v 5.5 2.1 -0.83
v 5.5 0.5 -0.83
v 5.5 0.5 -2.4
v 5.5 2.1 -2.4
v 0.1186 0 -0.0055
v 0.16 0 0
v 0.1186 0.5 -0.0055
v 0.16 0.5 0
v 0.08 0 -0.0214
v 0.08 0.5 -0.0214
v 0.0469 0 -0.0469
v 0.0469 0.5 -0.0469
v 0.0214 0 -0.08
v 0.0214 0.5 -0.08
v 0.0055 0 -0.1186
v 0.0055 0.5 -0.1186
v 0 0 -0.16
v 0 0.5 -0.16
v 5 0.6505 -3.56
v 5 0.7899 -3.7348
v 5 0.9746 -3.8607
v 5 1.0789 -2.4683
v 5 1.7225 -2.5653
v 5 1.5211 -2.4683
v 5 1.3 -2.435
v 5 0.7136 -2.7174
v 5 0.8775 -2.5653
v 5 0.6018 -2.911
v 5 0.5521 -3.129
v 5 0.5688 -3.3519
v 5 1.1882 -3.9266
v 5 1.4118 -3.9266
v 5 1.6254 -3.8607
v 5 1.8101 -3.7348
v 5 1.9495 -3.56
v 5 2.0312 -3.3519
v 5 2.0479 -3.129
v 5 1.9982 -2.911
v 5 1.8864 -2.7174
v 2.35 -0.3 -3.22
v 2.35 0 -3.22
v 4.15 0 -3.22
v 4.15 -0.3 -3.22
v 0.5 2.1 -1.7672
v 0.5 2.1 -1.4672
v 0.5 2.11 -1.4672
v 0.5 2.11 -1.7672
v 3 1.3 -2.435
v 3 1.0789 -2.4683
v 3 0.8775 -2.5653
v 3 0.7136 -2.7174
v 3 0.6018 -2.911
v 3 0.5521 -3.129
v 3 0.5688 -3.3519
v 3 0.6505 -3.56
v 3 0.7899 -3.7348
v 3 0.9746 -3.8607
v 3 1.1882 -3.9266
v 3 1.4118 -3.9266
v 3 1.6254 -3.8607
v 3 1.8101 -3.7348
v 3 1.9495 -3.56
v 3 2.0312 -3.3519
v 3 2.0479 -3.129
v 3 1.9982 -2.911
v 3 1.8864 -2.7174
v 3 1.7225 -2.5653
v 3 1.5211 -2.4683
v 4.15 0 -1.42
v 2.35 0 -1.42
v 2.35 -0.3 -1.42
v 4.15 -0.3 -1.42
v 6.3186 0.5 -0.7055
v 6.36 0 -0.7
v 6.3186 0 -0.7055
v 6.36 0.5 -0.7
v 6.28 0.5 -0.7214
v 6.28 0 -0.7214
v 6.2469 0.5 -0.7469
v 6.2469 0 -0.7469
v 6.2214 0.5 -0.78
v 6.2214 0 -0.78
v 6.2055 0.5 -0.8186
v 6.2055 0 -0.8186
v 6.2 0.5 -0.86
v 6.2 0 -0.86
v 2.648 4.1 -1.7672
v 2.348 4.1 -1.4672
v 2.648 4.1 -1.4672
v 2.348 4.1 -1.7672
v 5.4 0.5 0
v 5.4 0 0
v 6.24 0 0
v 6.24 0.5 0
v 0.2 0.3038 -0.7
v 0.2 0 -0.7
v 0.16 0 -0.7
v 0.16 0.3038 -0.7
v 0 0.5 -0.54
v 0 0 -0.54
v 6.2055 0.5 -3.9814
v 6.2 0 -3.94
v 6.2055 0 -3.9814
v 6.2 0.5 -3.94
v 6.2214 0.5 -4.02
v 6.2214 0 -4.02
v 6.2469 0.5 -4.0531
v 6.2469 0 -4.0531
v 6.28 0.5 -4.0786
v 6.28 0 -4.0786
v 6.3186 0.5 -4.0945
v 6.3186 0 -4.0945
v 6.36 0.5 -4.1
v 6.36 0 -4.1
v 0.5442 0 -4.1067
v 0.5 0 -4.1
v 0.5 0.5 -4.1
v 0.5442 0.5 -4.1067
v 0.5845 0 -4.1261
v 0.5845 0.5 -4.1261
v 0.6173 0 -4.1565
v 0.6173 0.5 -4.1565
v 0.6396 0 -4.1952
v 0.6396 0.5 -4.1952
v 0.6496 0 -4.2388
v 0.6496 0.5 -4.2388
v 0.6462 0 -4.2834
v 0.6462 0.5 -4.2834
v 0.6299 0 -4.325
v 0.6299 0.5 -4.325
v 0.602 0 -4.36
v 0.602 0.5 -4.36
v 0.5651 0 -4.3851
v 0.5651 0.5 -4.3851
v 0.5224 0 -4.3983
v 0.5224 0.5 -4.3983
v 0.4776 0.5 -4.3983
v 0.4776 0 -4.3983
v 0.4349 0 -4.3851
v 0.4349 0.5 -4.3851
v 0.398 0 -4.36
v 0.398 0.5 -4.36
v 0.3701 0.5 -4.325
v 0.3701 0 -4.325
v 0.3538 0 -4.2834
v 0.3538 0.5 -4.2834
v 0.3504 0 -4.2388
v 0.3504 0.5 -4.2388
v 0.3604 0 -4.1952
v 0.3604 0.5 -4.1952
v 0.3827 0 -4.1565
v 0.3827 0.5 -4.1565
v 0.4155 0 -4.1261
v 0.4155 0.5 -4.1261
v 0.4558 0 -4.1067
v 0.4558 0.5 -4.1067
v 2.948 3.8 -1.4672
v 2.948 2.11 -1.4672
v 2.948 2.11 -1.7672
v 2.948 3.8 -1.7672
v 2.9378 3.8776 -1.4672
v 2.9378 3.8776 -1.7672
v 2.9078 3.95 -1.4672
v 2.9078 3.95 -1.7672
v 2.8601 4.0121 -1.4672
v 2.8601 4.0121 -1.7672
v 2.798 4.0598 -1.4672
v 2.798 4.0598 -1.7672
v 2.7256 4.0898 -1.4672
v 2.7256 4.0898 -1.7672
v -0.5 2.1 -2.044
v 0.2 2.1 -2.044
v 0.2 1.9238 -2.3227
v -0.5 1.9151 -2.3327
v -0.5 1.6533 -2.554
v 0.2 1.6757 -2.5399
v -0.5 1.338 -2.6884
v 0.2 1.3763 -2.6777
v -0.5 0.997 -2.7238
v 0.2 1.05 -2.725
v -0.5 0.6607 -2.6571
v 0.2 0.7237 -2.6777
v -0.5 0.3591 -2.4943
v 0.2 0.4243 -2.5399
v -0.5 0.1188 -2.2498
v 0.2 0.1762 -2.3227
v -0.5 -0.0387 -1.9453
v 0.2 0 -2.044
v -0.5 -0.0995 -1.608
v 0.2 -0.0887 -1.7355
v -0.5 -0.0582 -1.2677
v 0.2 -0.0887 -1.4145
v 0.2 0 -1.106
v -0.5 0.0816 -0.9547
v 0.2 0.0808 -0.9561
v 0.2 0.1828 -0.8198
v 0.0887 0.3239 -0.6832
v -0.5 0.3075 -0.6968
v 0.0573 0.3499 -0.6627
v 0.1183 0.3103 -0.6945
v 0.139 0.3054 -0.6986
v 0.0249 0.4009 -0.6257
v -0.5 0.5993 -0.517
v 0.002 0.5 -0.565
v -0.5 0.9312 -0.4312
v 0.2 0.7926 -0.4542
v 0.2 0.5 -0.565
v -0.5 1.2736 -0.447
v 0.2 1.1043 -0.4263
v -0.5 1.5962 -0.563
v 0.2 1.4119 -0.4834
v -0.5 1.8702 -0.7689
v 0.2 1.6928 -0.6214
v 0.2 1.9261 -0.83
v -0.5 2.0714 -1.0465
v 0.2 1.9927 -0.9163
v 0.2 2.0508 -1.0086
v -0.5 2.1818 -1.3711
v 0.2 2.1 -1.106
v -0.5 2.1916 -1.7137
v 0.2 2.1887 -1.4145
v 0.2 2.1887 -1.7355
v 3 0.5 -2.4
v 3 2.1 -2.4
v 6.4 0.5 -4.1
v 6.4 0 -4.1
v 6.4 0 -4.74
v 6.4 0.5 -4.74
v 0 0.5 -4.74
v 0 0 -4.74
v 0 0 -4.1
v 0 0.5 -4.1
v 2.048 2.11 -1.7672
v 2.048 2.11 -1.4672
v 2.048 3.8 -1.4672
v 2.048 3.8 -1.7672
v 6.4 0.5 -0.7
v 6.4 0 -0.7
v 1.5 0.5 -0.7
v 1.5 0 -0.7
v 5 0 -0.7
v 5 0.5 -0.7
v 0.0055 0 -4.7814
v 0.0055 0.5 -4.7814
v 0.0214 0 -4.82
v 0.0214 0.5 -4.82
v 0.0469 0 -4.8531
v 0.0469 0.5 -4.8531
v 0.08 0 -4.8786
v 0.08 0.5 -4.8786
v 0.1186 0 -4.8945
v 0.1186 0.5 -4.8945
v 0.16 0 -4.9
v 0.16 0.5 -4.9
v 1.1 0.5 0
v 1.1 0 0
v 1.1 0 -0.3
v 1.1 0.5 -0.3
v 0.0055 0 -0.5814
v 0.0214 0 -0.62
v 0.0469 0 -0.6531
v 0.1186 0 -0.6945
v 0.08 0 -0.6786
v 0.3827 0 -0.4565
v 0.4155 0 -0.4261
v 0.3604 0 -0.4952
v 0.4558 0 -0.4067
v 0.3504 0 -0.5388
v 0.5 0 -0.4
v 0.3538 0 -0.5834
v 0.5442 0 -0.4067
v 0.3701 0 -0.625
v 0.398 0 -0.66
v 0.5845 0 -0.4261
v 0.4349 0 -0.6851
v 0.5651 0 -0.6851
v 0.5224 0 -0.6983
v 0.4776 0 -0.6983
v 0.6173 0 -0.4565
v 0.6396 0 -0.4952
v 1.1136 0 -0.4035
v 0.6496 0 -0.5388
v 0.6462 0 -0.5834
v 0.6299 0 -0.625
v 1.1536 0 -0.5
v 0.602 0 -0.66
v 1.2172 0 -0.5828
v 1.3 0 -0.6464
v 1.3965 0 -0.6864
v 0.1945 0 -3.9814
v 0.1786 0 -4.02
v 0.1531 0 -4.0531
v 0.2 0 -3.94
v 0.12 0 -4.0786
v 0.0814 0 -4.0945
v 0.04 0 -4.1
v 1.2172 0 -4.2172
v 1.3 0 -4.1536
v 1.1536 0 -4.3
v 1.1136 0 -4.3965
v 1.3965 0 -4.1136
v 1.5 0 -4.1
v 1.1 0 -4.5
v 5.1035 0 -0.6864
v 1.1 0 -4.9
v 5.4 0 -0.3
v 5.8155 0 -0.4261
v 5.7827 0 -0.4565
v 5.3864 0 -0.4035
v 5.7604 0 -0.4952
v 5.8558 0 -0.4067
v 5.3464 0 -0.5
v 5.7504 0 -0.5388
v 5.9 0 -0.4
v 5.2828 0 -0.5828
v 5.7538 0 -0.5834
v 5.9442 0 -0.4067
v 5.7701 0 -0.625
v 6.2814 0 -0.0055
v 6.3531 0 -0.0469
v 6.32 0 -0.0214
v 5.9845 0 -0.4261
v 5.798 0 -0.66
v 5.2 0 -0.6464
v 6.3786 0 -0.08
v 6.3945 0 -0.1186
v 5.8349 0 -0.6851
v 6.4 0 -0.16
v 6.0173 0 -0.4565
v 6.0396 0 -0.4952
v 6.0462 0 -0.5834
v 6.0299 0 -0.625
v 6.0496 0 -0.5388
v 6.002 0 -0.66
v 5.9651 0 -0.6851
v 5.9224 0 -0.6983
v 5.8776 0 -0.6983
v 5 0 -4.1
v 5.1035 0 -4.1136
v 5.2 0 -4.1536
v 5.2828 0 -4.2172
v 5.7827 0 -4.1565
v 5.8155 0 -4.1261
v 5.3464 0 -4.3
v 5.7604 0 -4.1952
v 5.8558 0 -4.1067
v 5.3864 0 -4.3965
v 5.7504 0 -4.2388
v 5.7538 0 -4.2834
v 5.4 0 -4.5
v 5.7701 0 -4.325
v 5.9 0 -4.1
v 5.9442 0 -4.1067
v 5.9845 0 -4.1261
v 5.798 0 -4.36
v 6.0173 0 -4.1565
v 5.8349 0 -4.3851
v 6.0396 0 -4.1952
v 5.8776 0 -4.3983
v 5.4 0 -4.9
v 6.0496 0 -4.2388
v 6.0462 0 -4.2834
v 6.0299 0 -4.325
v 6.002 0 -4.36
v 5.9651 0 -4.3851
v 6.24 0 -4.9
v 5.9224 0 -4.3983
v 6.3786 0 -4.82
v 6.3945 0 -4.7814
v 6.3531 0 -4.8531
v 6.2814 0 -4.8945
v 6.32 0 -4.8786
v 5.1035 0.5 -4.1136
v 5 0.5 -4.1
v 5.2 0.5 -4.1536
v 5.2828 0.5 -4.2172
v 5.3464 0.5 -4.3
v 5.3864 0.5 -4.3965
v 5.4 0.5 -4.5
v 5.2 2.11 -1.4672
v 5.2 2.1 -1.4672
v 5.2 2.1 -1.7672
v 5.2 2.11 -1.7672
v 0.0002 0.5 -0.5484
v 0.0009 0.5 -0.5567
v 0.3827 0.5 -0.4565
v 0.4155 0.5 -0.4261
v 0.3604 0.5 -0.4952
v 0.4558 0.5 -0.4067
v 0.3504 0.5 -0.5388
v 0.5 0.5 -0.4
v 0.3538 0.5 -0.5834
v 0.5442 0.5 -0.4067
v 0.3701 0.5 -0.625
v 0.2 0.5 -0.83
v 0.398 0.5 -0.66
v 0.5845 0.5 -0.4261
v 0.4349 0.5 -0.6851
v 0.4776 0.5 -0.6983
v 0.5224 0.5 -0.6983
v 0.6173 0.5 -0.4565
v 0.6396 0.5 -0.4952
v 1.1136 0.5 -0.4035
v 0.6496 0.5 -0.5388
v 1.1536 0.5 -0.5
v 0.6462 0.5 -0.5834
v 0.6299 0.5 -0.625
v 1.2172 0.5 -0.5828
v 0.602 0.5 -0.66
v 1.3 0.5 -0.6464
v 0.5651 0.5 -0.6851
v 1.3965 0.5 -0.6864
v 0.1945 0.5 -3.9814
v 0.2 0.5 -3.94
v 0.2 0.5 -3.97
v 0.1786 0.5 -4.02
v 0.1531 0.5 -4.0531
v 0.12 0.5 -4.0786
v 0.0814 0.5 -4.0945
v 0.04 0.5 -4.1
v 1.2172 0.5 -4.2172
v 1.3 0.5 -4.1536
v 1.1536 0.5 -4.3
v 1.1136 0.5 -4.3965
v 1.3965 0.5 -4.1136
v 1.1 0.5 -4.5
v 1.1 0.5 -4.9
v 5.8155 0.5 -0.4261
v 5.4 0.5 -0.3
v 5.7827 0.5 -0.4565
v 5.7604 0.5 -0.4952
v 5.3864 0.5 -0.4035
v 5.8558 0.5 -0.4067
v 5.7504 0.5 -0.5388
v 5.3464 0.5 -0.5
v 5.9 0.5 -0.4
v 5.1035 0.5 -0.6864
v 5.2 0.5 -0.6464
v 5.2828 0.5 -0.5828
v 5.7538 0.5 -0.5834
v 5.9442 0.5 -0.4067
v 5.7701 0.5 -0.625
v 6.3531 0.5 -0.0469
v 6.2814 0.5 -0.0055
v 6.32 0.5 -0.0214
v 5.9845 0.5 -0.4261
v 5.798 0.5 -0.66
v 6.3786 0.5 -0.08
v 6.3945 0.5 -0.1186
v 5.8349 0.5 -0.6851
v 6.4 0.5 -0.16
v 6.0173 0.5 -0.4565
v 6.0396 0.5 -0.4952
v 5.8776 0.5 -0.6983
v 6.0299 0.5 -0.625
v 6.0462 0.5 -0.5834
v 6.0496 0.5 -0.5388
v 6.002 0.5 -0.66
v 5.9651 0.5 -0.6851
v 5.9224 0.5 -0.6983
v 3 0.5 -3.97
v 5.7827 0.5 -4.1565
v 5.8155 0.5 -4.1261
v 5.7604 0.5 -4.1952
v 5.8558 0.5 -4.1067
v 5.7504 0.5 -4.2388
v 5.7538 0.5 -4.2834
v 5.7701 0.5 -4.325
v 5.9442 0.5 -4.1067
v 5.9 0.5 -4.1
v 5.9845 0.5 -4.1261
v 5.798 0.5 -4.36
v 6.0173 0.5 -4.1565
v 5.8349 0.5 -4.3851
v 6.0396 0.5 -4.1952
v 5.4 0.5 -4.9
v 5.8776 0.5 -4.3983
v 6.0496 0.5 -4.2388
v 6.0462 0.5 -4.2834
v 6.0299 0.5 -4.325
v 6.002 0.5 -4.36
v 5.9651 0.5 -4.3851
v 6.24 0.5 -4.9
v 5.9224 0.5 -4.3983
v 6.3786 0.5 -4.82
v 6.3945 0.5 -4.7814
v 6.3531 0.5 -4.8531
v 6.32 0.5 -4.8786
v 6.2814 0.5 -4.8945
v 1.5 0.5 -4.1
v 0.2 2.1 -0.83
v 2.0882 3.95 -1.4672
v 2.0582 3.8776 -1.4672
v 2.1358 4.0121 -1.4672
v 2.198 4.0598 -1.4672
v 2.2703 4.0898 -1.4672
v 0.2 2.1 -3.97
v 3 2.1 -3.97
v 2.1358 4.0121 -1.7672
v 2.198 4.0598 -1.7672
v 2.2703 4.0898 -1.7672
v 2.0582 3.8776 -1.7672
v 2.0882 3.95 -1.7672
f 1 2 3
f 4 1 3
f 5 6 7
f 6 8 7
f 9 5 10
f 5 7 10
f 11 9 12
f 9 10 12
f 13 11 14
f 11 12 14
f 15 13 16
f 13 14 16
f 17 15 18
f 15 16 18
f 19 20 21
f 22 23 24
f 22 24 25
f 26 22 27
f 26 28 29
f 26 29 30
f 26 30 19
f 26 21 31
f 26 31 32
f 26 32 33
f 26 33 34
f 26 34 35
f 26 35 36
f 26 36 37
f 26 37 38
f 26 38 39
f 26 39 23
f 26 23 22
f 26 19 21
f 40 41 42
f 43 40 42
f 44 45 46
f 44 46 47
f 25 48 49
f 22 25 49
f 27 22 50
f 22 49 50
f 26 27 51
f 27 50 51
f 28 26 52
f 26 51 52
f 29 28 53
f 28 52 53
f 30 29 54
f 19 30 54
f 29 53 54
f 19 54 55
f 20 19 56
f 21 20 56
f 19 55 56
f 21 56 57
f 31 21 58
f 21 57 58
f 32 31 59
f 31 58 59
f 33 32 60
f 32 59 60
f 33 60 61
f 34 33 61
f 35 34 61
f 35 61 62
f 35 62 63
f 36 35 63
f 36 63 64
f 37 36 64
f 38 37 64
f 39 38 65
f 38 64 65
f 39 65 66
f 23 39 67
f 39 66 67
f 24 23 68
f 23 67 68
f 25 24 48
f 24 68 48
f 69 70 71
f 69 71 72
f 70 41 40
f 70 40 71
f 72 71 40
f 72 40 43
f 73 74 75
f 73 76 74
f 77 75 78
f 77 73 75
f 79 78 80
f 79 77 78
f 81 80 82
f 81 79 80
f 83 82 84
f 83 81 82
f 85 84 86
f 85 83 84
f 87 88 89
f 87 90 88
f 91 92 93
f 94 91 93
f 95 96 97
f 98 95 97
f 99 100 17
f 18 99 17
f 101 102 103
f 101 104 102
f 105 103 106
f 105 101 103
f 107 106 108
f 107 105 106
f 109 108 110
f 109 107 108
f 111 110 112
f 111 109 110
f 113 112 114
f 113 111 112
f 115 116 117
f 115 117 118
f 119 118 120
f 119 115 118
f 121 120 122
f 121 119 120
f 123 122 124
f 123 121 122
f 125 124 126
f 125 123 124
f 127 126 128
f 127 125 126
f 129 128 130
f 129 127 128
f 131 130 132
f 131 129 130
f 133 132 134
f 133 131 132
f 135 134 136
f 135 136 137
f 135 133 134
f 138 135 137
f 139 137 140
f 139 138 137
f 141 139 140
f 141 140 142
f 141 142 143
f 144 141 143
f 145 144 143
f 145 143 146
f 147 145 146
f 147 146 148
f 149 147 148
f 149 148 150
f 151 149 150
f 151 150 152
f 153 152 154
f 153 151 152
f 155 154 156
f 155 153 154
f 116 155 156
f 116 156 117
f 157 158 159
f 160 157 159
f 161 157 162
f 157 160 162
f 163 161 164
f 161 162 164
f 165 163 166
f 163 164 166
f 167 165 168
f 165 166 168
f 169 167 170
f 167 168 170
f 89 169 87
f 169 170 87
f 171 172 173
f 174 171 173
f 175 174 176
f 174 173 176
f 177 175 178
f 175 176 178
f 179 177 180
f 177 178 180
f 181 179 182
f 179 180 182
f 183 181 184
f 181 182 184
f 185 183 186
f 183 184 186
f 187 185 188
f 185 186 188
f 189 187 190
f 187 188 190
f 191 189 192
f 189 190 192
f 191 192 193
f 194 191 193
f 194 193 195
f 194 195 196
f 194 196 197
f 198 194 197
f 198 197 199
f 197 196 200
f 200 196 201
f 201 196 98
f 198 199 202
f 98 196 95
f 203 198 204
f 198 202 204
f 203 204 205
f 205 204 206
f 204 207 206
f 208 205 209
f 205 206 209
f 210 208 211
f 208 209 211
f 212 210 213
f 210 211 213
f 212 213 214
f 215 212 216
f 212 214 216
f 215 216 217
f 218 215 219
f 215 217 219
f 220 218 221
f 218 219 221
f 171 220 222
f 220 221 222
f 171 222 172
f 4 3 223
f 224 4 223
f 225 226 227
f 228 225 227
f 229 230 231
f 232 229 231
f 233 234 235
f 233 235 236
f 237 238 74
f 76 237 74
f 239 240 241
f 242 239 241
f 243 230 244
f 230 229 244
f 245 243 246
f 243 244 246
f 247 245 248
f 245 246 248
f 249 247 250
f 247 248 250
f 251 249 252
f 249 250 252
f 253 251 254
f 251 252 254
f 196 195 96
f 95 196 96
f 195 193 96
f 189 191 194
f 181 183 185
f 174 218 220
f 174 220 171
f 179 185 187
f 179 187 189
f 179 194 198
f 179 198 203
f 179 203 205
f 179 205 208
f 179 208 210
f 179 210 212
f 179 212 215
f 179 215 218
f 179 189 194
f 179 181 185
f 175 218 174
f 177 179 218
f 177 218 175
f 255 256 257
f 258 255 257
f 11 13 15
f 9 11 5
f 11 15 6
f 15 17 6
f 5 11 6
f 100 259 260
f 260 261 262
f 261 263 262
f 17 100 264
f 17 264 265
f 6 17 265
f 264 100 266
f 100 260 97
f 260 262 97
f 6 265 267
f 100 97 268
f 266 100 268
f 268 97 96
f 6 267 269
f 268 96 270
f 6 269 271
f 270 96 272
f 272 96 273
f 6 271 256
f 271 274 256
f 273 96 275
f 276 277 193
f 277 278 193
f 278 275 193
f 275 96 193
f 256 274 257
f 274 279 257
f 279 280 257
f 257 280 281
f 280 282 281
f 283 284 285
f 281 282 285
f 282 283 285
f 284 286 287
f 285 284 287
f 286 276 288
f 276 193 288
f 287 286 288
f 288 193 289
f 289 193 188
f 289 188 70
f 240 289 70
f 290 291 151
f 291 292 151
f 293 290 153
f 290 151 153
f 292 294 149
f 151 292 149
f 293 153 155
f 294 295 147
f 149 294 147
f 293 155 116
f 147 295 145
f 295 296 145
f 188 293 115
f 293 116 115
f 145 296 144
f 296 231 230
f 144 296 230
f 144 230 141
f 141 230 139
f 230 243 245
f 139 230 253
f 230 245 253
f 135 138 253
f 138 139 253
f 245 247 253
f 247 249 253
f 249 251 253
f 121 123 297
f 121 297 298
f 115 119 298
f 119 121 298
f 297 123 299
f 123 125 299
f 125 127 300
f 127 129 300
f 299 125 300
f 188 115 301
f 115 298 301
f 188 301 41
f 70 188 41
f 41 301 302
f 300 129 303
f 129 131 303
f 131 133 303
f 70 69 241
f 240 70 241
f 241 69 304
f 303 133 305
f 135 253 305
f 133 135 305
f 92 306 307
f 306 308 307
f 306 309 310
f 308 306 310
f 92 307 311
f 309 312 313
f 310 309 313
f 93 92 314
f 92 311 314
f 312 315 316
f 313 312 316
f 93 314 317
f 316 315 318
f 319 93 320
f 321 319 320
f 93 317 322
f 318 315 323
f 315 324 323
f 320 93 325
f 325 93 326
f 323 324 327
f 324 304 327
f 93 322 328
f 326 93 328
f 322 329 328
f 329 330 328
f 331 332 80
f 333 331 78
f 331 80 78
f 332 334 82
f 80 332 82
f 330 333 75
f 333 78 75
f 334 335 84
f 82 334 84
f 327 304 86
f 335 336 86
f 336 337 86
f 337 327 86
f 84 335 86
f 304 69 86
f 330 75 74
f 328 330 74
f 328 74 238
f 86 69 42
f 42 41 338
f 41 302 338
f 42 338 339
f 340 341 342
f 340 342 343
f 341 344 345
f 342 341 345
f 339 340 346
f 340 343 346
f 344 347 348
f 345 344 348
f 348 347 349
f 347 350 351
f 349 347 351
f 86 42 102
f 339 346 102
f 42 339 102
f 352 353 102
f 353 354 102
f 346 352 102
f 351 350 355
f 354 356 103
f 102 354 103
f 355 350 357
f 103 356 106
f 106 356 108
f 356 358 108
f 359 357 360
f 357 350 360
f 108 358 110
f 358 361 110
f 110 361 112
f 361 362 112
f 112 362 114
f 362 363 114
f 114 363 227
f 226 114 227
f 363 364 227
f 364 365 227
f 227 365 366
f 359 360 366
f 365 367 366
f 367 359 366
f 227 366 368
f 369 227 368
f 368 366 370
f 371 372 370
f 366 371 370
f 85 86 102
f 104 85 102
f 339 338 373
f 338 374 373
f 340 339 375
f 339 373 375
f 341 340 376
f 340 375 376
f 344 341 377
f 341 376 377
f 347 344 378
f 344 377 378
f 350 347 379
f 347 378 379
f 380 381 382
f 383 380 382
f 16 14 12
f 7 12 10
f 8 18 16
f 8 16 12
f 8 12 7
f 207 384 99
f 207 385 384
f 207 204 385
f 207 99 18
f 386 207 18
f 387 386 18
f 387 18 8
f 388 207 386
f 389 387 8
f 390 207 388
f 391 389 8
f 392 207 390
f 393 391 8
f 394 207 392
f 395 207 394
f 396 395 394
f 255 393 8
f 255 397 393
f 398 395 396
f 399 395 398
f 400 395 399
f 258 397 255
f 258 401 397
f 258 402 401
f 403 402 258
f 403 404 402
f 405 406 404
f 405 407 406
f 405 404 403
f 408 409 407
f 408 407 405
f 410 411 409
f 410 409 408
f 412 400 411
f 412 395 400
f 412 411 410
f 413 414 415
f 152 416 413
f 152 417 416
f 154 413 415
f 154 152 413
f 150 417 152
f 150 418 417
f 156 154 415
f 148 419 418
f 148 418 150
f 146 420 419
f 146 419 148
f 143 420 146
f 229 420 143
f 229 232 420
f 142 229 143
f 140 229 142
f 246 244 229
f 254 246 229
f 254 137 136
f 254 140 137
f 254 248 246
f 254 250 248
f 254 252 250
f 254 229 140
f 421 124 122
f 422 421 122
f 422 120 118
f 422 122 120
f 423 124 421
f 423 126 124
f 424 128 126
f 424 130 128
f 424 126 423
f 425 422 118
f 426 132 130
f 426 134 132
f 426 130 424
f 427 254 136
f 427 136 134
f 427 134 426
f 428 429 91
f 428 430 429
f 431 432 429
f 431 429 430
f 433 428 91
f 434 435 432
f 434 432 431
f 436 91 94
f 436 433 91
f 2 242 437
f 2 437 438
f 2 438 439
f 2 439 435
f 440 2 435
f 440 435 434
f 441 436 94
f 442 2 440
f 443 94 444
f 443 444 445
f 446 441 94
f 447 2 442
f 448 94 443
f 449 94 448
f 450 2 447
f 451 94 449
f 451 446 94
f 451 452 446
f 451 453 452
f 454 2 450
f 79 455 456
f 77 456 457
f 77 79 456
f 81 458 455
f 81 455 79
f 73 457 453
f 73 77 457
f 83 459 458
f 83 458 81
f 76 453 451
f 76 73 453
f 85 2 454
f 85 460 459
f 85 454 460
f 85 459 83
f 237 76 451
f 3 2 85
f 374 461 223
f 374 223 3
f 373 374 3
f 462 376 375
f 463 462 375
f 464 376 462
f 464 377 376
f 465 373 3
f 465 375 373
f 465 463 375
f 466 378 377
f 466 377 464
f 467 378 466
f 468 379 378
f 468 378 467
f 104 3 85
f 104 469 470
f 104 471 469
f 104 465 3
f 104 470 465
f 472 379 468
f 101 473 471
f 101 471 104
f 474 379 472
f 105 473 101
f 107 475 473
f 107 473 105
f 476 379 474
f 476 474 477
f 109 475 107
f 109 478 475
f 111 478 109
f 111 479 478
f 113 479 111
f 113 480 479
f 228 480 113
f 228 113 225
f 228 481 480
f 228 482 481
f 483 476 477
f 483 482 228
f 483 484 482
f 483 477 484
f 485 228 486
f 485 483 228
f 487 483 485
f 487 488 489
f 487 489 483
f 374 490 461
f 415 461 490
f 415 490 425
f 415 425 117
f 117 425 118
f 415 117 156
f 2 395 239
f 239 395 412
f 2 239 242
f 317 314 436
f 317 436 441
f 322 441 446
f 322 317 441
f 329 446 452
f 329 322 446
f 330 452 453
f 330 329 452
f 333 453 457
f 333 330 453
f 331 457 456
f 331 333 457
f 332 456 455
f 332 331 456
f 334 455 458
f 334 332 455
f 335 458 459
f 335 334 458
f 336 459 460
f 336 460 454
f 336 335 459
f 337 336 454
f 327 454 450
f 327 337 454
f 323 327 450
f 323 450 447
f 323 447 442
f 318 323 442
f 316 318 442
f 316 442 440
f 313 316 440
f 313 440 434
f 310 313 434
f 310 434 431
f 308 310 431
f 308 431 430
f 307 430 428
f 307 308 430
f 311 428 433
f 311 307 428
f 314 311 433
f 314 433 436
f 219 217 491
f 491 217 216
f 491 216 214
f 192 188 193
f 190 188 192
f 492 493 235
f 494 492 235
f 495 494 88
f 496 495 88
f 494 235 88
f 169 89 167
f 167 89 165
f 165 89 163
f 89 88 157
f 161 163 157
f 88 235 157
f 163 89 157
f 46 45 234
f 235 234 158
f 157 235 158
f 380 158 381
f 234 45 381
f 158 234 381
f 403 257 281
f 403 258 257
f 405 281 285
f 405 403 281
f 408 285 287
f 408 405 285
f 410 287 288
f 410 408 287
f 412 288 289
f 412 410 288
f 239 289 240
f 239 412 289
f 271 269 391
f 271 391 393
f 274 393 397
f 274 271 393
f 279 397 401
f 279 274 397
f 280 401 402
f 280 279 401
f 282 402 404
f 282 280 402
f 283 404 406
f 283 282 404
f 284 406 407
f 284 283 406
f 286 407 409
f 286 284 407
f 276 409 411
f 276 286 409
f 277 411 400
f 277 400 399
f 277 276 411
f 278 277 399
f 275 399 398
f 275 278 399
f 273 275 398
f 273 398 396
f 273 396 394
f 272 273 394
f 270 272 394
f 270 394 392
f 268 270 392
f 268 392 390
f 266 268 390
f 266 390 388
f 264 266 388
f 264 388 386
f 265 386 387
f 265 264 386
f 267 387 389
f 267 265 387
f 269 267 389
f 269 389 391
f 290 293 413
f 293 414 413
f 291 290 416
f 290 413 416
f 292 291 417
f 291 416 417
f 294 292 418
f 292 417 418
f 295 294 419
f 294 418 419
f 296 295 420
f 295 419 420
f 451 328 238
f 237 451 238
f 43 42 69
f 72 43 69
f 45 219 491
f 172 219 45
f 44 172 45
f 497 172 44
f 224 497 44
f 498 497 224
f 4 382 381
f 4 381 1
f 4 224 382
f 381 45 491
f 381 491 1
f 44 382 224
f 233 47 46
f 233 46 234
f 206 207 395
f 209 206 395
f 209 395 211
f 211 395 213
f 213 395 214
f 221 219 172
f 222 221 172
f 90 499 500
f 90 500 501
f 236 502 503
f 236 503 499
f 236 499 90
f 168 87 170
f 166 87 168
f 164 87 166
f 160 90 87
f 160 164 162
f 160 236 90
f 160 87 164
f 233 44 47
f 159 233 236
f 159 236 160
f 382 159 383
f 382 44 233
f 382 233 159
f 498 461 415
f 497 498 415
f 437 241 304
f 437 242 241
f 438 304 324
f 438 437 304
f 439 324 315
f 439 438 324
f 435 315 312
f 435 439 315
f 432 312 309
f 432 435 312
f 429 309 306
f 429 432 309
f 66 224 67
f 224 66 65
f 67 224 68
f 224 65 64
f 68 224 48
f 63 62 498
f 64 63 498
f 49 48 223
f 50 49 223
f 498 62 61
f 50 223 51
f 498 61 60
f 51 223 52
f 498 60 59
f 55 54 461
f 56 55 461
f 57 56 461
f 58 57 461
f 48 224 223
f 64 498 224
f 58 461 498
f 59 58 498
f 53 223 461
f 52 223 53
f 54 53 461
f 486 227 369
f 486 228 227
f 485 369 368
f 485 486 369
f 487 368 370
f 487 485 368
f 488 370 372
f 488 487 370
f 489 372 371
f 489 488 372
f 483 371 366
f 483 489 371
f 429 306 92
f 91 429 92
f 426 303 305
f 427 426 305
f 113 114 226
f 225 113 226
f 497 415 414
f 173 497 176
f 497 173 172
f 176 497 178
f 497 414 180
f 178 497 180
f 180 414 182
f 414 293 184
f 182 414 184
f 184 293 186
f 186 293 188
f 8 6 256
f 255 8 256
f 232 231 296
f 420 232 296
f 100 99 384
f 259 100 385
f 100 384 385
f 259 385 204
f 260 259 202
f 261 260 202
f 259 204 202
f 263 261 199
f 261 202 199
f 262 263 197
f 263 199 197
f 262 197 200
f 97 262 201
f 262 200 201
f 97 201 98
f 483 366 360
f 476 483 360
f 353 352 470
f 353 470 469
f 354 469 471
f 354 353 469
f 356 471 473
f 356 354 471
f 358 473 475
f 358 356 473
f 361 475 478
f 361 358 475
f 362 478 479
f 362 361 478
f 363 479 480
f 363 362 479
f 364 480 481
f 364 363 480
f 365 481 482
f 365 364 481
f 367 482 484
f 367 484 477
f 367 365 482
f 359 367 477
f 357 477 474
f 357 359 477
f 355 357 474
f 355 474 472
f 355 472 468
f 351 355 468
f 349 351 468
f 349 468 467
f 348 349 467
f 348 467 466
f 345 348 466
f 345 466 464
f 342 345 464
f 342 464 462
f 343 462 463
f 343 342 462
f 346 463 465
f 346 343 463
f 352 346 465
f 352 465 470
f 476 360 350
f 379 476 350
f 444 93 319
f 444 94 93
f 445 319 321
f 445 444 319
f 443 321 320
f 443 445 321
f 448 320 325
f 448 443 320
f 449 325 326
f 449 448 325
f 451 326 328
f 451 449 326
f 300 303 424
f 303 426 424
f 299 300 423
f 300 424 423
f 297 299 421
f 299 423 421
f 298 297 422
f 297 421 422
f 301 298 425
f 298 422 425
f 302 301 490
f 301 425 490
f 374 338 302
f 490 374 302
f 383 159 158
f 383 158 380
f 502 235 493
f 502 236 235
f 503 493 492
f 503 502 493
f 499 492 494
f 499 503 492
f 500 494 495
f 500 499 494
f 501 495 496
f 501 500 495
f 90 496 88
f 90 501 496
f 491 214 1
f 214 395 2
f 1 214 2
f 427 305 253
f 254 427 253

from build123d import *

# Parameters (mm, degrees)
SKETCH1_R            = 0.15
BOSS_EXTRUDE1_DEPTH  = 0.5
FILLET1_R            = 0.4
FILLET2_R            = 0.16
BOSS_EXTRUDE2_DEPTH  = 1.6
SKETCH3_R            = 0.75
BOSS_EXTRUDE7_DEPTH  = 2
SKETCH4_W            = 1.8
SKETCH4_H            = 1.8
BOSS_EXTRUDE8_DEPTH  = 0.3
SKETCH5_R            = 1.15
BOSS_EXTRUDE9_DEPTH  = 0.7
SKETCH6_W            = 0.9
SKETCH6_H            = 0.3
BOSS_EXTRUDE10_DEPTH = 2
FILLET3_R            = 0.3
SKETCH7_W            = 4.7
SKETCH7_H            = 0.3
BOSS_EXTRUDE11_DEPTH = 0.01


with BuildPart() as part:
    # Sketch1 → Boss-Extrude1 (new body)
    with BuildSketch(Plane(origin=(0, 0, 0), x_dir=(1, 0, 0), z_dir=(0, 1, 0))):
        Polygon((0, 0), (1.1, 0), (1.1, 0.7), (5.4, 0.7), (5.4, 0), (6.4, 0), (6.4, 0.7), (6.2, 0.7), (6.2, 4.1), (6.4, 4.1), (6.4, 4.9), (5.4, 4.9), (5.4, 4.1), (1.1, 4.1), (1.1, 4.9), (0, 4.9), (0, 4.1), (0.2, 4.1), (0.2, 0.7), (0, 0.7), align=None)
        with Locations(Location((0.5, 4.25, 0), (0, 0, 270))):
            Circle(SKETCH1_R, mode=Mode.SUBTRACT)
        with Locations(Location((0.5, 0.55, 0), (0, 0, 270))):
            Circle(SKETCH1_R, mode=Mode.SUBTRACT)
        with Locations(Location((5.9, 0.55, 0), (0, 0, 270))):
            Circle(SKETCH1_R, mode=Mode.SUBTRACT)
        with Locations(Location((5.9, 4.25, 0), (0, 0, 270))):
            Circle(SKETCH1_R, mode=Mode.SUBTRACT)
    extrude(amount=BOSS_EXTRUDE1_DEPTH)

    # Fillet1
    fillet1_edges = [part.edges().sort_by_distance(p)[0] for p in [
        (1.1, 0.25, -4.1),
        (5.4, 0.25, -4.1),
        (5.4, 0.25, -0.7),
        (1.1, 0.25, -0.7),
    ]]
    fillet(fillet1_edges, radius=FILLET1_R)

    # Fillet2
    fillet2_edges = [part.edges().sort_by_distance(p)[0] for p in [
        (0, 0.25, -0.7),
        (0.2, 0.25, -4.1),
        (0, 0.25, -4.9),
        (6.4, 0.25, -4.9),
        (6.2, 0.25, -4.1),
        (6.2, 0.25, -0.7),
        (6.4, 0.25, 0),
        (0, 0.25, 0),
    ]]
    fillet(fillet2_edges, radius=FILLET2_R)

    # Sketch2 → Boss-Extrude2 (add)
    with BuildSketch(Plane(origin=(0, 0.5, 0), x_dir=(1, 0, 0), z_dir=(0, 1, 0))):
        Polygon((0.2, 0.83), (5.5, 0.83), (5.5, 2.4), (3, 2.4), (3, 3.97), (0.2, 3.97), align=None)
    extrude(amount=BOSS_EXTRUDE2_DEPTH)

    # Sketch3 → Boss-Extrude7 (add)
    with BuildSketch(Plane(origin=(3, 0, 0), x_dir=(0, 0, -1), z_dir=(1, 0, 0))):
        with Locations(Location((3.185, 1.3, 0), (0, 0, 180))):
            Circle(SKETCH3_R)
    extrude(amount=BOSS_EXTRUDE7_DEPTH)

    # Sketch4 → Boss-Extrude8 (add)
    with BuildSketch(Plane.XZ):
        with Locations((3.25, -2.32)):
            Rectangle(SKETCH4_W, SKETCH4_H)
    extrude(amount=BOSS_EXTRUDE8_DEPTH)

    # Sketch5 → Boss-Extrude9 (add)
    with BuildSketch(Plane.ZY.offset(-0.2)):
        with Locations(Location((-1.575, 1.05, 0), (0, 0, 114.070614623))):
            Circle(SKETCH5_R)
    extrude(amount=BOSS_EXTRUDE9_DEPTH)

    # Sketch6 → Boss-Extrude10 (add)
    with BuildSketch(Plane(origin=(0, 2.1, 0), x_dir=(1, 0, 0), z_dir=(0, 1, 0))):
        with Locations((2.497976847, 1.617210326)):
            Rectangle(SKETCH6_W, SKETCH6_H)
    extrude(amount=BOSS_EXTRUDE10_DEPTH)

    # Fillet3
    fillet3_edges = [part.edges().sort_by_distance(p)[0] for p in [
        (2.047976847, 4.1, -1.617210326),
        (2.947976847, 4.1, -1.617210326),
    ]]
    fillet(fillet3_edges, radius=FILLET3_R)

    # Sketch7 → Boss-Extrude11 (add)
    with BuildSketch(Plane(origin=(0, 2.1, 0), x_dir=(1, 0, 0), z_dir=(0, 1, 0))):
        with Locations((2.85, 1.617210326)):
            Rectangle(SKETCH7_W, SKETCH7_H)
    extrude(amount=BOSS_EXTRUDE11_DEPTH)


solid = part.part
